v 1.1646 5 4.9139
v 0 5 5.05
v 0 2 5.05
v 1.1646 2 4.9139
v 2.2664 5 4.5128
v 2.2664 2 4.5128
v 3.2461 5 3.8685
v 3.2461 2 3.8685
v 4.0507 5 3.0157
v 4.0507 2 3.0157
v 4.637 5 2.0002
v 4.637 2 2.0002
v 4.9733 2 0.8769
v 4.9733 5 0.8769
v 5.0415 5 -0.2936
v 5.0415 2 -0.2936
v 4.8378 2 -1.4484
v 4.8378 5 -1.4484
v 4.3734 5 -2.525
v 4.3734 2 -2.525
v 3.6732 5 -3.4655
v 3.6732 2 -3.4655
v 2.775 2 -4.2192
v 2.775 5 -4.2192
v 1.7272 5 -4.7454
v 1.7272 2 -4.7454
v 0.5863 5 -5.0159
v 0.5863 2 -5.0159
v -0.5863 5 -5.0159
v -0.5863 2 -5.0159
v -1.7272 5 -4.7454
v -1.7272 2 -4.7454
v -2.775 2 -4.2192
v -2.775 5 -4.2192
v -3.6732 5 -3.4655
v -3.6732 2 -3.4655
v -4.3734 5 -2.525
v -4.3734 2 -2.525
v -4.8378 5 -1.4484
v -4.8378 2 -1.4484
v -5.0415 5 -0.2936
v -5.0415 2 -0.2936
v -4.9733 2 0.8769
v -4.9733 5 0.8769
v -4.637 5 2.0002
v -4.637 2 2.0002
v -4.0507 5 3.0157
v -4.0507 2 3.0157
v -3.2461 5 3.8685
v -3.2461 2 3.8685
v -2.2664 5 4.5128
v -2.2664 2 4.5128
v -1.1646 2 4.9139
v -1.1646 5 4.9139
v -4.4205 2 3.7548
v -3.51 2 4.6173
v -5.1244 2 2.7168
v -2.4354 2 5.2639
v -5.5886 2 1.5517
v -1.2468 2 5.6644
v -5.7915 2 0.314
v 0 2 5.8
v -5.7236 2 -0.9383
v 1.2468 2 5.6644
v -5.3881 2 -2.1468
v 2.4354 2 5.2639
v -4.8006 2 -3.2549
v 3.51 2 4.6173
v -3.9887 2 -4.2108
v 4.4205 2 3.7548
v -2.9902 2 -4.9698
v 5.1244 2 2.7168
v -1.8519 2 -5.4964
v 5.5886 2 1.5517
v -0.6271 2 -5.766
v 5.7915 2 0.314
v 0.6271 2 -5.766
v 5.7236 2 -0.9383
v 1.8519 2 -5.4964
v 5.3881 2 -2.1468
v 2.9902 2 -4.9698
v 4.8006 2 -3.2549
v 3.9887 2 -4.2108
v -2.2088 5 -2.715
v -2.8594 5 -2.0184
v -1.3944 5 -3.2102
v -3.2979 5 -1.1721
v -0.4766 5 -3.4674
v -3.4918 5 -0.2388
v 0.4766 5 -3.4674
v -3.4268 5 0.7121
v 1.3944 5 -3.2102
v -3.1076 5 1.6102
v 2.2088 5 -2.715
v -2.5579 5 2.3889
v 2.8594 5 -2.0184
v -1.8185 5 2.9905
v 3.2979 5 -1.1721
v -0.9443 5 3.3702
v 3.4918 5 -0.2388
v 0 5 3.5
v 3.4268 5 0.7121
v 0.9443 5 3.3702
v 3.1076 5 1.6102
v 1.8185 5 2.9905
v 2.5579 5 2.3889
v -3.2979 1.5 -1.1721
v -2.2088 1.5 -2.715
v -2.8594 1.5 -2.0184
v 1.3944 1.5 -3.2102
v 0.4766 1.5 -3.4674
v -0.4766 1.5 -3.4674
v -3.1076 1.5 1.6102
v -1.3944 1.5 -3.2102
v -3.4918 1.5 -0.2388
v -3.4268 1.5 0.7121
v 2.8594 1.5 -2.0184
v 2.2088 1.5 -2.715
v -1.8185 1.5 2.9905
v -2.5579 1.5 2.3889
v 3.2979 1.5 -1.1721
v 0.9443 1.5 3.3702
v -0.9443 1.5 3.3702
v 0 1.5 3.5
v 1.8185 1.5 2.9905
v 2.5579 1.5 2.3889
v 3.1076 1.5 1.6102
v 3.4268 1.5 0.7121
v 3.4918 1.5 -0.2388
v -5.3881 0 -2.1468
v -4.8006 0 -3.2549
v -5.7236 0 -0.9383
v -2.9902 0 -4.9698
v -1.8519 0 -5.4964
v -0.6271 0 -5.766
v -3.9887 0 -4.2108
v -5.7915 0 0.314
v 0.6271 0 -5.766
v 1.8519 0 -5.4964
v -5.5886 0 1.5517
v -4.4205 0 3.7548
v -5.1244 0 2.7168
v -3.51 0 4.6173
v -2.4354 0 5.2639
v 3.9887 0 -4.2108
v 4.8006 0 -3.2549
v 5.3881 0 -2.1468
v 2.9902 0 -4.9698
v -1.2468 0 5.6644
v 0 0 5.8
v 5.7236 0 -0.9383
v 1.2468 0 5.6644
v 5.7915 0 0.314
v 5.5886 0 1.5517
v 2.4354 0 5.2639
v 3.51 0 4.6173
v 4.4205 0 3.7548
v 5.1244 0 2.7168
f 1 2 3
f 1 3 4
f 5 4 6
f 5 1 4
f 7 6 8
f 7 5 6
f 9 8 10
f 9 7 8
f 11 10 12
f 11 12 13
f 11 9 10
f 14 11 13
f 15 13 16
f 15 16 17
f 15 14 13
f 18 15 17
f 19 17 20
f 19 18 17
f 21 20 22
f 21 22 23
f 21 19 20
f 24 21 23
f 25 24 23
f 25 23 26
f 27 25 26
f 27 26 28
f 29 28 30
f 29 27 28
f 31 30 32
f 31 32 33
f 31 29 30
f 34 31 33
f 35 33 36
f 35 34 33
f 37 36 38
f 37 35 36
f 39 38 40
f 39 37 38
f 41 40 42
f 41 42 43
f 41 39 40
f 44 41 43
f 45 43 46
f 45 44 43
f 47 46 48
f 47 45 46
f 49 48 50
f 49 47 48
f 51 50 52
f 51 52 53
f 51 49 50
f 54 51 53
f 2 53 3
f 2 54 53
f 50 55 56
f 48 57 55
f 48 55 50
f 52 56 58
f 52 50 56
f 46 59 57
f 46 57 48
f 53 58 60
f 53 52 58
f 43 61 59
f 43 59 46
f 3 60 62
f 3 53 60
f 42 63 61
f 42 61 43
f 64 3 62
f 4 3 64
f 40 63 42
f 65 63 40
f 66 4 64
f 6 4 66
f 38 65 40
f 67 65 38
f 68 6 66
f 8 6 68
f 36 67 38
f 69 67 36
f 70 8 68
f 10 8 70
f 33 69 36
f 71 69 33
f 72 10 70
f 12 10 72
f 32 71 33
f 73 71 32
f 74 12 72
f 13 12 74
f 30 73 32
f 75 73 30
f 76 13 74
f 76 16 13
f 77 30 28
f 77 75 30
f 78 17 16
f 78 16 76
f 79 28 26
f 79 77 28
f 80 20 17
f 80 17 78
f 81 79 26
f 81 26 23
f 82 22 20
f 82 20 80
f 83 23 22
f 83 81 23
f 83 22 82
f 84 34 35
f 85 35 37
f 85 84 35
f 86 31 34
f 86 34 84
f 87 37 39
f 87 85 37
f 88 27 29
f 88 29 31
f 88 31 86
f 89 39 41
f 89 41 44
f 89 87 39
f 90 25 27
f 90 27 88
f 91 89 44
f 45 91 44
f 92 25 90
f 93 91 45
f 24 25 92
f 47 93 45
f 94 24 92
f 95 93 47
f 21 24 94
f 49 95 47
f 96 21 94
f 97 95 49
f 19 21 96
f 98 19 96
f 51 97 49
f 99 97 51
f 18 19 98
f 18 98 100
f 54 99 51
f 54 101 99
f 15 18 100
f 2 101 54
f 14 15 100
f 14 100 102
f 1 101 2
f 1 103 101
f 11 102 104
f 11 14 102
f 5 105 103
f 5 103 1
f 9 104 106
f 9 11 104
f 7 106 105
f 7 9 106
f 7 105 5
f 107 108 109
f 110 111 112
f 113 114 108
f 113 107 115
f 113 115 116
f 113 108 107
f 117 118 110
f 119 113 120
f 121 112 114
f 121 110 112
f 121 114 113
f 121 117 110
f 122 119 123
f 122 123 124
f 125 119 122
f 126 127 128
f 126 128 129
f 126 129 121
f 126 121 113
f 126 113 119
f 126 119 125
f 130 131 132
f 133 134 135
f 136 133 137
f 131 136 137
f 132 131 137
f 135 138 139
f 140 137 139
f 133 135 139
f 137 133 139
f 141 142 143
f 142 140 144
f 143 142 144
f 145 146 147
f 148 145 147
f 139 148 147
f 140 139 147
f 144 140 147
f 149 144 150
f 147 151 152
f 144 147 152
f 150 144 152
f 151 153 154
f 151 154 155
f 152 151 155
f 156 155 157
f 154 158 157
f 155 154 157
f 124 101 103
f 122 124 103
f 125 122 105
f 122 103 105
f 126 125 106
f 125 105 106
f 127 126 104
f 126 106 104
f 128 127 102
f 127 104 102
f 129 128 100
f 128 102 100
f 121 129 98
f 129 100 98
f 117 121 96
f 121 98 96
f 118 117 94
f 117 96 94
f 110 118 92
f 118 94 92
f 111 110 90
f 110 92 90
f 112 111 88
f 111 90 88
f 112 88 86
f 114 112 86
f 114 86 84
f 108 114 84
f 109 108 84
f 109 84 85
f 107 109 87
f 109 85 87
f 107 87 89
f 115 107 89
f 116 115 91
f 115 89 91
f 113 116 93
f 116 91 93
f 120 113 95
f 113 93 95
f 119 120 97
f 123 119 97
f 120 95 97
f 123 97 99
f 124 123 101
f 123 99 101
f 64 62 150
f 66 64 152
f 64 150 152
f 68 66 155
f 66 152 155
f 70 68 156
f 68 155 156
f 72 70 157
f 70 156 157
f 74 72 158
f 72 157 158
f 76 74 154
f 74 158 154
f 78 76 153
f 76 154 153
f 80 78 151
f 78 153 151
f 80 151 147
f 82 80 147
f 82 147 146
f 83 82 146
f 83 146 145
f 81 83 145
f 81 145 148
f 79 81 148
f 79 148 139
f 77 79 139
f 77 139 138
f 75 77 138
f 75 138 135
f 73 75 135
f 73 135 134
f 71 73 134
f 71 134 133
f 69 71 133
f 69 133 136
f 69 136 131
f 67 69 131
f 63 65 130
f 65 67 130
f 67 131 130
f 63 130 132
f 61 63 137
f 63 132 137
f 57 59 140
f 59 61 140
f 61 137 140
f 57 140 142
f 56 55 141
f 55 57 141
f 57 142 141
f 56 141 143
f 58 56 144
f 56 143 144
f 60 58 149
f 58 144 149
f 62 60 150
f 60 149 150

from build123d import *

# Parameters (mm, degrees)
SKETCH1_R           = 5.8
BOSS_EXTRUDE1_DEPTH = 5
SKETCH2_R           = 3.5
CUT_EXTRUDE1_DEPTH  = 3.5
SKETCH3_R           = 8.275638688
SKETCH3_R_2         = 5.05
CUT_EXTRUDE2_DEPTH  = 3


with BuildPart() as part:
    # Sketch1 → Boss-Extrude1 (new body)
    with BuildSketch(Plane(origin=(0, 0, 0), x_dir=(1, 0, 0), z_dir=(0, 1, 0))):
        with Locations(Location((0, 0, 0), (0, 0, 270))):
            Circle(SKETCH1_R)
    extrude(amount=BOSS_EXTRUDE1_DEPTH)

    # Sketch2 → Cut-Extrude1 (cut)
    with BuildSketch(Plane(origin=(0, 5, 0), x_dir=(1, 0, 0), z_dir=(0, 1, 0))):
        with Locations(Location((0, 0, 0), (0, 0, 270))):
            Circle(SKETCH2_R)
    extrude(amount=-CUT_EXTRUDE1_DEPTH, mode=Mode.SUBTRACT)

    # Sketch3 → Cut-Extrude2 (cut)
    with BuildSketch(Plane(origin=(0, 5, 0), x_dir=(1, 0, 0), z_dir=(0, 1, 0))):
        Circle(SKETCH3_R)
        with Locations(Location((0, 0, 0), (0, 0, 270))):
            Circle(SKETCH3_R_2, mode=Mode.SUBTRACT)
    extrude(amount=-CUT_EXTRUDE2_DEPTH, mode=Mode.SUBTRACT)


solid = part.part
